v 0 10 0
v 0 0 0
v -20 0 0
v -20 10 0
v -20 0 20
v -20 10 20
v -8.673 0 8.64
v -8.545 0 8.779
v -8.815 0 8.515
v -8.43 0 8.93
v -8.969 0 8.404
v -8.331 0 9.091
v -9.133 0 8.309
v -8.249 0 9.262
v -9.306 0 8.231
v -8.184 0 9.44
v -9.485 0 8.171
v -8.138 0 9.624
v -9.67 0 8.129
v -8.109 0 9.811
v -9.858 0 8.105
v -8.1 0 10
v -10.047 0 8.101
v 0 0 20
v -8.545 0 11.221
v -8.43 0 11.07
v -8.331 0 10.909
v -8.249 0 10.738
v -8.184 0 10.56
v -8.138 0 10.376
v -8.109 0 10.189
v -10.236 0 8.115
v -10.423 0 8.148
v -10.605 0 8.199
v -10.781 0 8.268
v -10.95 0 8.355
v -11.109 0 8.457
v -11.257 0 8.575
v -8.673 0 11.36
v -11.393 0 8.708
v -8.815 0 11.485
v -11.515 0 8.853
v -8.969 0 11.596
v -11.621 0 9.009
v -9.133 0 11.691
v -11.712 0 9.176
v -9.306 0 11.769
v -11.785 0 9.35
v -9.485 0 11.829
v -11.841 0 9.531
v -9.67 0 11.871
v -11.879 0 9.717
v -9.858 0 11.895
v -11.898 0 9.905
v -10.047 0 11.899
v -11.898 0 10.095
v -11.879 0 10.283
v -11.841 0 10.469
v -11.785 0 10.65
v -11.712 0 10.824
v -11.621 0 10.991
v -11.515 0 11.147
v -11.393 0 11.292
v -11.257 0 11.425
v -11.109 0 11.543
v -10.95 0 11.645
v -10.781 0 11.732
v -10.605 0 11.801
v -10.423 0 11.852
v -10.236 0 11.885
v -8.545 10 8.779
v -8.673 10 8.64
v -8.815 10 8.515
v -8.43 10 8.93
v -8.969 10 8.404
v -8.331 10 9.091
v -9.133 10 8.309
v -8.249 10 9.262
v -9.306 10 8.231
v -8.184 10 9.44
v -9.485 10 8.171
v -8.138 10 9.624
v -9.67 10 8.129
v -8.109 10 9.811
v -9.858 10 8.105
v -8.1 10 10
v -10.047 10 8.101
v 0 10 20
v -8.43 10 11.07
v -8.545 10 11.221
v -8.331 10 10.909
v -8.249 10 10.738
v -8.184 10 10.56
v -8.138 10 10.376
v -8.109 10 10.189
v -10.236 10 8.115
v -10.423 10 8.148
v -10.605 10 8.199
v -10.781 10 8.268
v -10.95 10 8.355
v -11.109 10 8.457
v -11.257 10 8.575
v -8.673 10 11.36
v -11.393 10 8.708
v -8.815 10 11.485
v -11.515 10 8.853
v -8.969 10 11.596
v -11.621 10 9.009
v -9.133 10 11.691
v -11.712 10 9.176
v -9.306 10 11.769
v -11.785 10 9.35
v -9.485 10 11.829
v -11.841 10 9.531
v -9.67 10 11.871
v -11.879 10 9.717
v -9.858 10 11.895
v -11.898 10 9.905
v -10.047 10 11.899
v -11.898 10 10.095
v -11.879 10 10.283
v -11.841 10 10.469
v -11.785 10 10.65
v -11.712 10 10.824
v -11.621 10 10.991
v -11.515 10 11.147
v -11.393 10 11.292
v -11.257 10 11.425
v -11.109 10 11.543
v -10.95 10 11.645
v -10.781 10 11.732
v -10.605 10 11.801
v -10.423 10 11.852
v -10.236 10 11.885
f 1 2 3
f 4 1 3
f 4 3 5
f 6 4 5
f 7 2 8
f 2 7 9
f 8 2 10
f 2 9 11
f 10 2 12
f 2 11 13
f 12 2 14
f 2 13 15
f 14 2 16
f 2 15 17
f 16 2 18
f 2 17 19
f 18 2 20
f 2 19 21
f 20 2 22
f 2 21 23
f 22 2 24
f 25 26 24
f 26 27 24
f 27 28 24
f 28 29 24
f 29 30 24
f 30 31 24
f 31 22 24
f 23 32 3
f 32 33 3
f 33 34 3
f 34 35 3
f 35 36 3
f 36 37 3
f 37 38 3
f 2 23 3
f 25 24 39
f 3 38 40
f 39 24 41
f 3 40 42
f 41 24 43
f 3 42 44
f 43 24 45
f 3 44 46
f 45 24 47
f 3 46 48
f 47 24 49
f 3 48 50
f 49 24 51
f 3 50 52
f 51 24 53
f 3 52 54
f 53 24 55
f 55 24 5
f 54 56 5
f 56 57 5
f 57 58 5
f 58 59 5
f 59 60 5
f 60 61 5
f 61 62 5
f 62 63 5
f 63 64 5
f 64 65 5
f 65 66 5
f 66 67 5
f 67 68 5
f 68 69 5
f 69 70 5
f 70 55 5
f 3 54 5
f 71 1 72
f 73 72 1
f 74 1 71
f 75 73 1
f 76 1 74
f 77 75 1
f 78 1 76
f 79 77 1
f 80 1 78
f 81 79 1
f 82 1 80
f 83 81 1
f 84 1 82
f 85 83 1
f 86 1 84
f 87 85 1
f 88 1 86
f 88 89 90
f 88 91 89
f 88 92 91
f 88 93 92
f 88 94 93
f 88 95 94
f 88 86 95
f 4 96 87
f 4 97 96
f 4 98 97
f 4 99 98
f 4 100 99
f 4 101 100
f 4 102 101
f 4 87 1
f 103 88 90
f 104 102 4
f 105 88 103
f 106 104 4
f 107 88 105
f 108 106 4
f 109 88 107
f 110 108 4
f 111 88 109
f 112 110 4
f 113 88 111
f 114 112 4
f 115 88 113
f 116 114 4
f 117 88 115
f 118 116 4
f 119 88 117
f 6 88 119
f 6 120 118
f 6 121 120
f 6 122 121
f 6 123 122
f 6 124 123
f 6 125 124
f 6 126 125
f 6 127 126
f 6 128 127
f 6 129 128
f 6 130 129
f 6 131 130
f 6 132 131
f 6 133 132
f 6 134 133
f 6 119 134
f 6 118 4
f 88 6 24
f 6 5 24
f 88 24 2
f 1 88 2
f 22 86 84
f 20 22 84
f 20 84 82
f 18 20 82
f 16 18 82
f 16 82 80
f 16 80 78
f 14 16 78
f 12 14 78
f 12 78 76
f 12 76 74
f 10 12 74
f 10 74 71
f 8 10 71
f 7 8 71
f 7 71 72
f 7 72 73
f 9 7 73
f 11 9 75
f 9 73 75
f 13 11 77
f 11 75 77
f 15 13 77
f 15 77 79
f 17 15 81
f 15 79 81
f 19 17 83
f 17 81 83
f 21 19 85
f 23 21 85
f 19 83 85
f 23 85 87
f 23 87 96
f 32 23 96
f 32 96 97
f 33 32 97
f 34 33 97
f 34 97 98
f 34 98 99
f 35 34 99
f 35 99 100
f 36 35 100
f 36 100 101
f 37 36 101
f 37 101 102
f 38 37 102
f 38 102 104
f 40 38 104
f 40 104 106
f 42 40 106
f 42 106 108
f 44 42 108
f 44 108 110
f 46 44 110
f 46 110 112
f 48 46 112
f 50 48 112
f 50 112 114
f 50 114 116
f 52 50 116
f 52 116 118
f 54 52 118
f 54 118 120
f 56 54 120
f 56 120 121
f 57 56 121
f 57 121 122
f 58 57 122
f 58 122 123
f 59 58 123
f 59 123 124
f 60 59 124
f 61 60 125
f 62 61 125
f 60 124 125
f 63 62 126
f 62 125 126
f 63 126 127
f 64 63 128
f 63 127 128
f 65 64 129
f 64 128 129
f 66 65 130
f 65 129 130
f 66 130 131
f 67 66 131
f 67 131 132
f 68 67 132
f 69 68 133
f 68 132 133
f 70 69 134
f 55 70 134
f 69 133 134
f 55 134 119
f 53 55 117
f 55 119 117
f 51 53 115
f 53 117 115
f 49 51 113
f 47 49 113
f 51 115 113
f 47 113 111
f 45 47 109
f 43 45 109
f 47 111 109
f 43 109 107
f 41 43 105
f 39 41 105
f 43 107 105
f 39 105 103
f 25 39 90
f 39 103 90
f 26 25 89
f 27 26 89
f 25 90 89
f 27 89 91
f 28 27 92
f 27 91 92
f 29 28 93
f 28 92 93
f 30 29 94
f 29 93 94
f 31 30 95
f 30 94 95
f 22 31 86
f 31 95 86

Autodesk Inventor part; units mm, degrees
ref_plane "YZ Plane" through (0, 0, 0) normal (1, 0, 0) x (0, 1, 0)
ref_plane "XZ Plane" through (0, 0, 0) normal (0, 1, 0) x (-1, 0, 0)
ref_plane "XY Plane" through (0, 0, 0) normal (0, 0, 1) x (1, 0, 0)
sketch "Sketch1" plane through (0, 0, 0) normal (0, 1, 0) x (-1, 0, 0)
  line L0 (0, 0) -> (20, 0)
  line L1 (20, 0) -> (20, 20)
  line L2 (20, 20) -> (0, 20)
  line L3 (0, 20) -> (0, 0)
  dimension "d0" = 20
  dimension "d1" = 20
extrude "Extrusion1" add sketch "Sketch1" along normal blind 10
sketch "Sketch2" plane through (0, 10, 0) normal (0, 1, 0) x (1, 0, 0)
  line L0 (0, 0) -> (-20, 0) construction
  line L1 (-10, 0) -> (-10, -20) construction
  line L2 (-20, -20) -> (0, -20) construction
  line L3 (-20, 0) -> (-20, -20) construction
  line L4 (-20, -10) -> (0, -10) construction
  line L5 (0, -20) -> (0, 0) construction
  circle A0 centre (-10, -10) radius 1.9
  dimension "d4" = 3.8
extrude "Extrusion3" cut sketch "Sketch2" against normal blind 20
properties part number "_3DPrint"
